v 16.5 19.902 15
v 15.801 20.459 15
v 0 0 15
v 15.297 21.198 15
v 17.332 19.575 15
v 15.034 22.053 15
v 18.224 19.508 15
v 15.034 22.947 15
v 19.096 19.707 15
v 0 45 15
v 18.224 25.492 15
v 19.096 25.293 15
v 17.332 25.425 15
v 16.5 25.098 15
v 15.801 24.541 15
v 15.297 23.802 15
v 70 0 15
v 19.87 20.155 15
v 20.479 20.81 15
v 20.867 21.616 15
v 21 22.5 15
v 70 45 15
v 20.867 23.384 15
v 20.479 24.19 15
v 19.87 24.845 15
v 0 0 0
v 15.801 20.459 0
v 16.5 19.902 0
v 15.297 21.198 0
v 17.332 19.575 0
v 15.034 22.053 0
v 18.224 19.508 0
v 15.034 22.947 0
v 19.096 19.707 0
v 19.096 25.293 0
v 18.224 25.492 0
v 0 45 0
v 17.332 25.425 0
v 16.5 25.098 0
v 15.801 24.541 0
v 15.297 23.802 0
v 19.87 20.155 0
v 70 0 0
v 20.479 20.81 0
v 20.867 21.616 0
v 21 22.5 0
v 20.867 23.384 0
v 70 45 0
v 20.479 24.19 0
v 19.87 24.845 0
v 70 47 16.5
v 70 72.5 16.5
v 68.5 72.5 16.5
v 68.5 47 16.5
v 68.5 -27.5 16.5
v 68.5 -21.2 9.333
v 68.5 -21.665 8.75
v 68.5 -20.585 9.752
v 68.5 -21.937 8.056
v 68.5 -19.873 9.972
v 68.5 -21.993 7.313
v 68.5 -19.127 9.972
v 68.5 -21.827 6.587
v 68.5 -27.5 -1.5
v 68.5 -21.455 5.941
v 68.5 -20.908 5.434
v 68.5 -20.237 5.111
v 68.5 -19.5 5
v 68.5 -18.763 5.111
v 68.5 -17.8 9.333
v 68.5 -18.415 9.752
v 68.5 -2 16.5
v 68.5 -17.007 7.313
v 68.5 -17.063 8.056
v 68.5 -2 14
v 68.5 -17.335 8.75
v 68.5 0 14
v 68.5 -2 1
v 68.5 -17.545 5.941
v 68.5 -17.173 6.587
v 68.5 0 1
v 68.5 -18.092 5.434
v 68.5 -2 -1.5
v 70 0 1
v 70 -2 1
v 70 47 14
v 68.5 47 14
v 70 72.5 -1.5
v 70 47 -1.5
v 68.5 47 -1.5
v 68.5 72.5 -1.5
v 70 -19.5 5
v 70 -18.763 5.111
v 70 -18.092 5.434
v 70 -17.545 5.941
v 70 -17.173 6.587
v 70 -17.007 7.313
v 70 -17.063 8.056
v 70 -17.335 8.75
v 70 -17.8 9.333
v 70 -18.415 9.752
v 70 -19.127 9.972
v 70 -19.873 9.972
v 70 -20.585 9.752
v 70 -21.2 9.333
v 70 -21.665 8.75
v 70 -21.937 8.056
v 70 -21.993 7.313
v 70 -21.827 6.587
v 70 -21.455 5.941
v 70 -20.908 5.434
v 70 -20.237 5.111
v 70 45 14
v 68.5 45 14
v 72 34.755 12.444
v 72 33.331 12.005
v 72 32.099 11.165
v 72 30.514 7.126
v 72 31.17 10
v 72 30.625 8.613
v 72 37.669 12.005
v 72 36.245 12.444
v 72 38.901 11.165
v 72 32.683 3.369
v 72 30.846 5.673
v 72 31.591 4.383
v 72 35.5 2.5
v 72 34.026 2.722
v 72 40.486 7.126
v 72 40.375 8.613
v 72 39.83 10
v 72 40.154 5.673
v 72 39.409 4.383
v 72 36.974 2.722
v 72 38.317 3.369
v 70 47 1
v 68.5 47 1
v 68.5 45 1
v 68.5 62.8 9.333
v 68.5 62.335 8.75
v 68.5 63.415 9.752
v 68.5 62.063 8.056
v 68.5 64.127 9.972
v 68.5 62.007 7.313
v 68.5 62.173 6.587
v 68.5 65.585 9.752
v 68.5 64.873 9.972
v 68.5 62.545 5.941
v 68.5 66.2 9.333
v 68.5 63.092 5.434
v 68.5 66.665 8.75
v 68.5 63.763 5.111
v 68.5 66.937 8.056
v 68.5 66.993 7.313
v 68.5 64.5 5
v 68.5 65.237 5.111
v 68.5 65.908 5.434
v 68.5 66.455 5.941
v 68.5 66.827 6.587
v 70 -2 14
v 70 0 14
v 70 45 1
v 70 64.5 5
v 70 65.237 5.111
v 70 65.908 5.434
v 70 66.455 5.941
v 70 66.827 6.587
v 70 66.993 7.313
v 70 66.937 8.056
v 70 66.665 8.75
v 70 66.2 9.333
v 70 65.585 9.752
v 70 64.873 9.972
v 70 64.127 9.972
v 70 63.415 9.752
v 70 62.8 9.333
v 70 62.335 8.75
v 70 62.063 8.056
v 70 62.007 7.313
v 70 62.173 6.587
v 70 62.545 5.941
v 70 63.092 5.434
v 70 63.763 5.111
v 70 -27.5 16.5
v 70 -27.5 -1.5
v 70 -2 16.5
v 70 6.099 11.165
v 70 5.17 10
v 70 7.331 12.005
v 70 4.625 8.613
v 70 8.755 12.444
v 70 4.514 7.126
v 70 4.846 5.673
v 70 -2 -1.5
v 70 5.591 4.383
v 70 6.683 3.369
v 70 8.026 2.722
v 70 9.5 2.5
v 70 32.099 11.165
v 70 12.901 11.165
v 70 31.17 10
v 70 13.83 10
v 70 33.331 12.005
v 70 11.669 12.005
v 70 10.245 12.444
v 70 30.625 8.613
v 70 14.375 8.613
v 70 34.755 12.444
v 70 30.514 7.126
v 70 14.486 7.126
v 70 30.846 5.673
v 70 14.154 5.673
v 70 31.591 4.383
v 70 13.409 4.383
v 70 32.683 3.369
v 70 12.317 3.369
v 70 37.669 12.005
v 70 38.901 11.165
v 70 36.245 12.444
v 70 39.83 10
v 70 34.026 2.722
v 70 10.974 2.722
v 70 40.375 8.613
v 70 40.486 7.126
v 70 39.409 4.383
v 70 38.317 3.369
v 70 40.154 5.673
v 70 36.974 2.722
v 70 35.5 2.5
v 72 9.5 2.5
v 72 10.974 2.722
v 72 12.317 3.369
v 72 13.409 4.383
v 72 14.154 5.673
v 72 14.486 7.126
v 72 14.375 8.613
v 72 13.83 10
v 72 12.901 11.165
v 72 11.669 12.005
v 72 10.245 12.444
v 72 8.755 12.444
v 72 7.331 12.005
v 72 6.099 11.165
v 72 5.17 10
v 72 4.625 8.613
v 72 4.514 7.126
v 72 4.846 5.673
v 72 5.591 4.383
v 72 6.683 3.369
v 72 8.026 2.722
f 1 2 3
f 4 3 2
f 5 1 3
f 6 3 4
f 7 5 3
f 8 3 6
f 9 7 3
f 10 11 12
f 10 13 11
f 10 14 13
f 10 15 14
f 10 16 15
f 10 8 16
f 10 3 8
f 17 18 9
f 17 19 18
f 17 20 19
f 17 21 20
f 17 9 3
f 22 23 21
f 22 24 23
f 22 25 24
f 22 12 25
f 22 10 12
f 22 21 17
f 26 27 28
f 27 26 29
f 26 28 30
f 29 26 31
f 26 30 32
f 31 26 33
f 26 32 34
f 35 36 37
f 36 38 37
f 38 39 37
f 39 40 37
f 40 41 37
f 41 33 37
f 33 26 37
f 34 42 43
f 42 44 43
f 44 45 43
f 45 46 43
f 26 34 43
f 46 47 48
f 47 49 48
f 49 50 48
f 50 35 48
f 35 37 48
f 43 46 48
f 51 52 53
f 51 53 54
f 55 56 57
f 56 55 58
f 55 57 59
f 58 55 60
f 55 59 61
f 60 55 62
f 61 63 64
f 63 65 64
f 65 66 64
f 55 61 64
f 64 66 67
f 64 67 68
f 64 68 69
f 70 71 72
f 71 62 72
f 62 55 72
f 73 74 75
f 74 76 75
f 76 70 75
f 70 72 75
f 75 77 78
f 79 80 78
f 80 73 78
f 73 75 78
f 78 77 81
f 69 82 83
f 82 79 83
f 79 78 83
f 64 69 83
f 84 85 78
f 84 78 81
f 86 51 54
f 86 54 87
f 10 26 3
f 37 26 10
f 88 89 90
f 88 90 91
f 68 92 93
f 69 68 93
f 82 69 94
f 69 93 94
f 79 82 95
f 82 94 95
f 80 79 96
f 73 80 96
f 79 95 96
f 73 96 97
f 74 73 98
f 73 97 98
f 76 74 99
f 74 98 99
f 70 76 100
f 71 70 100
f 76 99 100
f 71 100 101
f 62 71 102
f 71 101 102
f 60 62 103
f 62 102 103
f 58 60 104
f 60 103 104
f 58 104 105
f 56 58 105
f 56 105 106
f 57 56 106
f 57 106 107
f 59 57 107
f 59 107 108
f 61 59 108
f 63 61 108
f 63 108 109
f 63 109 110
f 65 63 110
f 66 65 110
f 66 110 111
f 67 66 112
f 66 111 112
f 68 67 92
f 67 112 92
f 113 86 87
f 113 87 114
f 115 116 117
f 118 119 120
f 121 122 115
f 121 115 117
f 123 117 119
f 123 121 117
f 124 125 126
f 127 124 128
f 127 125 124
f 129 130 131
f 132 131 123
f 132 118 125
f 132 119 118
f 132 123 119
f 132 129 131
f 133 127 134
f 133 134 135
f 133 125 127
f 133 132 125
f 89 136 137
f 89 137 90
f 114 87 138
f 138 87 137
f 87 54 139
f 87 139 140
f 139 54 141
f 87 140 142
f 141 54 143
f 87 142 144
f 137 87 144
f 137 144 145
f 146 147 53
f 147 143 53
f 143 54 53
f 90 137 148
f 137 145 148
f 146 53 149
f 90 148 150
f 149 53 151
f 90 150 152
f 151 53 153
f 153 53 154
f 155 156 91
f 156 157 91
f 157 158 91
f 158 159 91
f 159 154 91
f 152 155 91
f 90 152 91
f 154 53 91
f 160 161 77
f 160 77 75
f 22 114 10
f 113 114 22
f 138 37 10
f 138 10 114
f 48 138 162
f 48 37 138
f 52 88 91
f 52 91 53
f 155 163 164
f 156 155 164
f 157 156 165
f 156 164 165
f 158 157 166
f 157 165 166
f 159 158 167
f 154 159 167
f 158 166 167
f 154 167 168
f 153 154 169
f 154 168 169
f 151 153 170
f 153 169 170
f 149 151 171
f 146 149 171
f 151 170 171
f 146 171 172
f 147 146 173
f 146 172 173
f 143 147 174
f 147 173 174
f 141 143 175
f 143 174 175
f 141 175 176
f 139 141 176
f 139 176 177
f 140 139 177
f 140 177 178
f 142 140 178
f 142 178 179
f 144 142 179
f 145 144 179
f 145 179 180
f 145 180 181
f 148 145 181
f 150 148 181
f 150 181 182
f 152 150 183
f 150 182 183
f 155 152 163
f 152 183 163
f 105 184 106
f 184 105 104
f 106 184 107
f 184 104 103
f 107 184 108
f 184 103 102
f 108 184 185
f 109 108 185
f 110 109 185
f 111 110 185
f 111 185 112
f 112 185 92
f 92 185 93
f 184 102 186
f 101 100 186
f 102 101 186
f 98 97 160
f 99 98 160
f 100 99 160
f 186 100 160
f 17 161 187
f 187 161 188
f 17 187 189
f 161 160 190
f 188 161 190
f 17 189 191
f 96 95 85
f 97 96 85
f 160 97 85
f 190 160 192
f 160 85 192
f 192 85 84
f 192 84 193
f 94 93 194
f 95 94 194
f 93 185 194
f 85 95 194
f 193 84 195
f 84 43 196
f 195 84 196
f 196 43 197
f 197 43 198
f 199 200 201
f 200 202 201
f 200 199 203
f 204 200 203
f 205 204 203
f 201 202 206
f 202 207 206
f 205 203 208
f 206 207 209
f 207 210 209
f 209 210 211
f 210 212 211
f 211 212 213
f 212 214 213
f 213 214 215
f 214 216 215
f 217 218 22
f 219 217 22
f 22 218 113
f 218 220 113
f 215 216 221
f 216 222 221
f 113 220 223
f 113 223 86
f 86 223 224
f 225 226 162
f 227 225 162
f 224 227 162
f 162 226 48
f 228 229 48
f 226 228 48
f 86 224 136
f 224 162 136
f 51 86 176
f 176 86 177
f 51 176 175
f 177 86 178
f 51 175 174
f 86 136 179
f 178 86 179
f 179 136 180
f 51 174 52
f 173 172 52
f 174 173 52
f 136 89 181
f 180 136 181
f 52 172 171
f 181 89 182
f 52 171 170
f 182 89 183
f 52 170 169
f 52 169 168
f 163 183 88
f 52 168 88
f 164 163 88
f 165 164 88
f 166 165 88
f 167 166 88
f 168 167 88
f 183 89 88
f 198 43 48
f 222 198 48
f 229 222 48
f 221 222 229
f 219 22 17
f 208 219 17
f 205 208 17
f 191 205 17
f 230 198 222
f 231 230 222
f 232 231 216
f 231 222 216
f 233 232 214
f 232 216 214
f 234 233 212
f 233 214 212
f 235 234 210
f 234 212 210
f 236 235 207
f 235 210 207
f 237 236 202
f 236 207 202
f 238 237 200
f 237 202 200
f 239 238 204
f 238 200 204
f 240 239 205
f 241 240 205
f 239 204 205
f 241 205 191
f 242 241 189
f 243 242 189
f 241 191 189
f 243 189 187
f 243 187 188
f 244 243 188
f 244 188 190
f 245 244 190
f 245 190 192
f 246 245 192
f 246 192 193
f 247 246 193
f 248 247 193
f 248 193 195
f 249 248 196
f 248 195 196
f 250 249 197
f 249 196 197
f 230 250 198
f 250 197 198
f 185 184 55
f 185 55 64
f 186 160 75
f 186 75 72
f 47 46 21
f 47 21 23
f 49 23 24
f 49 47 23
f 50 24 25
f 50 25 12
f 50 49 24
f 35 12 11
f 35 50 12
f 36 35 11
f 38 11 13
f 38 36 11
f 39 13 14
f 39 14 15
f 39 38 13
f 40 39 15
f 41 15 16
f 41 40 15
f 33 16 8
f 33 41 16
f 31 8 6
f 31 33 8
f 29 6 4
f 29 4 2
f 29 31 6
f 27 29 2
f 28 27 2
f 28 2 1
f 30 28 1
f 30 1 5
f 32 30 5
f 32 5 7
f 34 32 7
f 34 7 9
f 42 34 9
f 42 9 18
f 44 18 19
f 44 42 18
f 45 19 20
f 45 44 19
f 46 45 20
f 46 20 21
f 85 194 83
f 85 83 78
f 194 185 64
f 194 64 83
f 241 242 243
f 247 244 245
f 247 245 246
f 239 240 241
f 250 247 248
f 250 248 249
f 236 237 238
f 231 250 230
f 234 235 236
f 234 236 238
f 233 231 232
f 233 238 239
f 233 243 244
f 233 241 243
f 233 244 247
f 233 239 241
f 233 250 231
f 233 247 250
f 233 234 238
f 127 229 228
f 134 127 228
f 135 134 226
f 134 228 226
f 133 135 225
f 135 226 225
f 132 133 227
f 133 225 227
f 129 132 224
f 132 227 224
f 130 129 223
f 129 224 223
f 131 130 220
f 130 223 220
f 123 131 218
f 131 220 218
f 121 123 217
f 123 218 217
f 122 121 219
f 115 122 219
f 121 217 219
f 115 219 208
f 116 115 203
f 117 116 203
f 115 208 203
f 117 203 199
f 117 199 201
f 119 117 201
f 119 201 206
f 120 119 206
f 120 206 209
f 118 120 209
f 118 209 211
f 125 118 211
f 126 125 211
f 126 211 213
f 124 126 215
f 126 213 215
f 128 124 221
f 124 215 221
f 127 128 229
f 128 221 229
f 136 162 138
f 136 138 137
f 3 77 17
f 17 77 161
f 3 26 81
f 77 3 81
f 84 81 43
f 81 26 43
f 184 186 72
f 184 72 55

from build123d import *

# Parameters (mm, degrees)
SKETCH1_W           = 70
SKETCH1_H           = 45
SKETCH1_R           = 3
BOSS_EXTRUDE1_DEPTH = 15
SKETCH2_R           = 2.5
BOSS_EXTRUDE2_DEPTH = 1.5
SKETCH3_R           = 5
BOSS_EXTRUDE3_DEPTH = 2


with BuildPart() as part:
    # Sketch1 → Boss-Extrude1 (new body)
    with BuildSketch(Plane.XY):
        with Locations((35, 22.5)):
            Rectangle(SKETCH1_W, SKETCH1_H)
        with Locations((18, 22.5)):
            Circle(SKETCH1_R, mode=Mode.SUBTRACT)
    extrude(amount=BOSS_EXTRUDE1_DEPTH)

    # Sketch2 → Boss-Extrude2 (add)
    with BuildSketch(Plane(origin=(70, 0, 0), x_dir=(0, 0, -1), z_dir=(1, 0, 0))):
        Polygon((-1, 42.953382973), (-1, 47), (1.5, 47), (1.5, 72.5), (-16.5, 72.5), (-16.5, 47), (-14, 47), (-14, 42.953382973), align=None)
        with Locations((-7.5, 64.5)):
            Circle(SKETCH2_R, mode=Mode.SUBTRACT)
        Polygon((-14, 2.046617027), (-14, -2), (-16.5, -2), (-16.5, -27.5), (1.5, -27.5), (1.5, -2), (-1, -2), (-1, 2.046617027), align=None)
        with Locations((-7.5, -19.5)):
            Circle(SKETCH2_R, mode=Mode.SUBTRACT)
    extrude(amount=-BOSS_EXTRUDE2_DEPTH)

    # Sketch3 → Boss-Extrude3 (add)
    with BuildSketch(Plane(origin=(70, 0, 0), x_dir=(0, 0, -1), z_dir=(1, 0, 0))):
        with Locations((-7.5, 35.5)):
            Circle(SKETCH3_R)
        with Locations((-7.5, 9.5)):
            Circle(SKETCH3_R)
    extrude(amount=BOSS_EXTRUDE3_DEPTH)


solid = part.part
